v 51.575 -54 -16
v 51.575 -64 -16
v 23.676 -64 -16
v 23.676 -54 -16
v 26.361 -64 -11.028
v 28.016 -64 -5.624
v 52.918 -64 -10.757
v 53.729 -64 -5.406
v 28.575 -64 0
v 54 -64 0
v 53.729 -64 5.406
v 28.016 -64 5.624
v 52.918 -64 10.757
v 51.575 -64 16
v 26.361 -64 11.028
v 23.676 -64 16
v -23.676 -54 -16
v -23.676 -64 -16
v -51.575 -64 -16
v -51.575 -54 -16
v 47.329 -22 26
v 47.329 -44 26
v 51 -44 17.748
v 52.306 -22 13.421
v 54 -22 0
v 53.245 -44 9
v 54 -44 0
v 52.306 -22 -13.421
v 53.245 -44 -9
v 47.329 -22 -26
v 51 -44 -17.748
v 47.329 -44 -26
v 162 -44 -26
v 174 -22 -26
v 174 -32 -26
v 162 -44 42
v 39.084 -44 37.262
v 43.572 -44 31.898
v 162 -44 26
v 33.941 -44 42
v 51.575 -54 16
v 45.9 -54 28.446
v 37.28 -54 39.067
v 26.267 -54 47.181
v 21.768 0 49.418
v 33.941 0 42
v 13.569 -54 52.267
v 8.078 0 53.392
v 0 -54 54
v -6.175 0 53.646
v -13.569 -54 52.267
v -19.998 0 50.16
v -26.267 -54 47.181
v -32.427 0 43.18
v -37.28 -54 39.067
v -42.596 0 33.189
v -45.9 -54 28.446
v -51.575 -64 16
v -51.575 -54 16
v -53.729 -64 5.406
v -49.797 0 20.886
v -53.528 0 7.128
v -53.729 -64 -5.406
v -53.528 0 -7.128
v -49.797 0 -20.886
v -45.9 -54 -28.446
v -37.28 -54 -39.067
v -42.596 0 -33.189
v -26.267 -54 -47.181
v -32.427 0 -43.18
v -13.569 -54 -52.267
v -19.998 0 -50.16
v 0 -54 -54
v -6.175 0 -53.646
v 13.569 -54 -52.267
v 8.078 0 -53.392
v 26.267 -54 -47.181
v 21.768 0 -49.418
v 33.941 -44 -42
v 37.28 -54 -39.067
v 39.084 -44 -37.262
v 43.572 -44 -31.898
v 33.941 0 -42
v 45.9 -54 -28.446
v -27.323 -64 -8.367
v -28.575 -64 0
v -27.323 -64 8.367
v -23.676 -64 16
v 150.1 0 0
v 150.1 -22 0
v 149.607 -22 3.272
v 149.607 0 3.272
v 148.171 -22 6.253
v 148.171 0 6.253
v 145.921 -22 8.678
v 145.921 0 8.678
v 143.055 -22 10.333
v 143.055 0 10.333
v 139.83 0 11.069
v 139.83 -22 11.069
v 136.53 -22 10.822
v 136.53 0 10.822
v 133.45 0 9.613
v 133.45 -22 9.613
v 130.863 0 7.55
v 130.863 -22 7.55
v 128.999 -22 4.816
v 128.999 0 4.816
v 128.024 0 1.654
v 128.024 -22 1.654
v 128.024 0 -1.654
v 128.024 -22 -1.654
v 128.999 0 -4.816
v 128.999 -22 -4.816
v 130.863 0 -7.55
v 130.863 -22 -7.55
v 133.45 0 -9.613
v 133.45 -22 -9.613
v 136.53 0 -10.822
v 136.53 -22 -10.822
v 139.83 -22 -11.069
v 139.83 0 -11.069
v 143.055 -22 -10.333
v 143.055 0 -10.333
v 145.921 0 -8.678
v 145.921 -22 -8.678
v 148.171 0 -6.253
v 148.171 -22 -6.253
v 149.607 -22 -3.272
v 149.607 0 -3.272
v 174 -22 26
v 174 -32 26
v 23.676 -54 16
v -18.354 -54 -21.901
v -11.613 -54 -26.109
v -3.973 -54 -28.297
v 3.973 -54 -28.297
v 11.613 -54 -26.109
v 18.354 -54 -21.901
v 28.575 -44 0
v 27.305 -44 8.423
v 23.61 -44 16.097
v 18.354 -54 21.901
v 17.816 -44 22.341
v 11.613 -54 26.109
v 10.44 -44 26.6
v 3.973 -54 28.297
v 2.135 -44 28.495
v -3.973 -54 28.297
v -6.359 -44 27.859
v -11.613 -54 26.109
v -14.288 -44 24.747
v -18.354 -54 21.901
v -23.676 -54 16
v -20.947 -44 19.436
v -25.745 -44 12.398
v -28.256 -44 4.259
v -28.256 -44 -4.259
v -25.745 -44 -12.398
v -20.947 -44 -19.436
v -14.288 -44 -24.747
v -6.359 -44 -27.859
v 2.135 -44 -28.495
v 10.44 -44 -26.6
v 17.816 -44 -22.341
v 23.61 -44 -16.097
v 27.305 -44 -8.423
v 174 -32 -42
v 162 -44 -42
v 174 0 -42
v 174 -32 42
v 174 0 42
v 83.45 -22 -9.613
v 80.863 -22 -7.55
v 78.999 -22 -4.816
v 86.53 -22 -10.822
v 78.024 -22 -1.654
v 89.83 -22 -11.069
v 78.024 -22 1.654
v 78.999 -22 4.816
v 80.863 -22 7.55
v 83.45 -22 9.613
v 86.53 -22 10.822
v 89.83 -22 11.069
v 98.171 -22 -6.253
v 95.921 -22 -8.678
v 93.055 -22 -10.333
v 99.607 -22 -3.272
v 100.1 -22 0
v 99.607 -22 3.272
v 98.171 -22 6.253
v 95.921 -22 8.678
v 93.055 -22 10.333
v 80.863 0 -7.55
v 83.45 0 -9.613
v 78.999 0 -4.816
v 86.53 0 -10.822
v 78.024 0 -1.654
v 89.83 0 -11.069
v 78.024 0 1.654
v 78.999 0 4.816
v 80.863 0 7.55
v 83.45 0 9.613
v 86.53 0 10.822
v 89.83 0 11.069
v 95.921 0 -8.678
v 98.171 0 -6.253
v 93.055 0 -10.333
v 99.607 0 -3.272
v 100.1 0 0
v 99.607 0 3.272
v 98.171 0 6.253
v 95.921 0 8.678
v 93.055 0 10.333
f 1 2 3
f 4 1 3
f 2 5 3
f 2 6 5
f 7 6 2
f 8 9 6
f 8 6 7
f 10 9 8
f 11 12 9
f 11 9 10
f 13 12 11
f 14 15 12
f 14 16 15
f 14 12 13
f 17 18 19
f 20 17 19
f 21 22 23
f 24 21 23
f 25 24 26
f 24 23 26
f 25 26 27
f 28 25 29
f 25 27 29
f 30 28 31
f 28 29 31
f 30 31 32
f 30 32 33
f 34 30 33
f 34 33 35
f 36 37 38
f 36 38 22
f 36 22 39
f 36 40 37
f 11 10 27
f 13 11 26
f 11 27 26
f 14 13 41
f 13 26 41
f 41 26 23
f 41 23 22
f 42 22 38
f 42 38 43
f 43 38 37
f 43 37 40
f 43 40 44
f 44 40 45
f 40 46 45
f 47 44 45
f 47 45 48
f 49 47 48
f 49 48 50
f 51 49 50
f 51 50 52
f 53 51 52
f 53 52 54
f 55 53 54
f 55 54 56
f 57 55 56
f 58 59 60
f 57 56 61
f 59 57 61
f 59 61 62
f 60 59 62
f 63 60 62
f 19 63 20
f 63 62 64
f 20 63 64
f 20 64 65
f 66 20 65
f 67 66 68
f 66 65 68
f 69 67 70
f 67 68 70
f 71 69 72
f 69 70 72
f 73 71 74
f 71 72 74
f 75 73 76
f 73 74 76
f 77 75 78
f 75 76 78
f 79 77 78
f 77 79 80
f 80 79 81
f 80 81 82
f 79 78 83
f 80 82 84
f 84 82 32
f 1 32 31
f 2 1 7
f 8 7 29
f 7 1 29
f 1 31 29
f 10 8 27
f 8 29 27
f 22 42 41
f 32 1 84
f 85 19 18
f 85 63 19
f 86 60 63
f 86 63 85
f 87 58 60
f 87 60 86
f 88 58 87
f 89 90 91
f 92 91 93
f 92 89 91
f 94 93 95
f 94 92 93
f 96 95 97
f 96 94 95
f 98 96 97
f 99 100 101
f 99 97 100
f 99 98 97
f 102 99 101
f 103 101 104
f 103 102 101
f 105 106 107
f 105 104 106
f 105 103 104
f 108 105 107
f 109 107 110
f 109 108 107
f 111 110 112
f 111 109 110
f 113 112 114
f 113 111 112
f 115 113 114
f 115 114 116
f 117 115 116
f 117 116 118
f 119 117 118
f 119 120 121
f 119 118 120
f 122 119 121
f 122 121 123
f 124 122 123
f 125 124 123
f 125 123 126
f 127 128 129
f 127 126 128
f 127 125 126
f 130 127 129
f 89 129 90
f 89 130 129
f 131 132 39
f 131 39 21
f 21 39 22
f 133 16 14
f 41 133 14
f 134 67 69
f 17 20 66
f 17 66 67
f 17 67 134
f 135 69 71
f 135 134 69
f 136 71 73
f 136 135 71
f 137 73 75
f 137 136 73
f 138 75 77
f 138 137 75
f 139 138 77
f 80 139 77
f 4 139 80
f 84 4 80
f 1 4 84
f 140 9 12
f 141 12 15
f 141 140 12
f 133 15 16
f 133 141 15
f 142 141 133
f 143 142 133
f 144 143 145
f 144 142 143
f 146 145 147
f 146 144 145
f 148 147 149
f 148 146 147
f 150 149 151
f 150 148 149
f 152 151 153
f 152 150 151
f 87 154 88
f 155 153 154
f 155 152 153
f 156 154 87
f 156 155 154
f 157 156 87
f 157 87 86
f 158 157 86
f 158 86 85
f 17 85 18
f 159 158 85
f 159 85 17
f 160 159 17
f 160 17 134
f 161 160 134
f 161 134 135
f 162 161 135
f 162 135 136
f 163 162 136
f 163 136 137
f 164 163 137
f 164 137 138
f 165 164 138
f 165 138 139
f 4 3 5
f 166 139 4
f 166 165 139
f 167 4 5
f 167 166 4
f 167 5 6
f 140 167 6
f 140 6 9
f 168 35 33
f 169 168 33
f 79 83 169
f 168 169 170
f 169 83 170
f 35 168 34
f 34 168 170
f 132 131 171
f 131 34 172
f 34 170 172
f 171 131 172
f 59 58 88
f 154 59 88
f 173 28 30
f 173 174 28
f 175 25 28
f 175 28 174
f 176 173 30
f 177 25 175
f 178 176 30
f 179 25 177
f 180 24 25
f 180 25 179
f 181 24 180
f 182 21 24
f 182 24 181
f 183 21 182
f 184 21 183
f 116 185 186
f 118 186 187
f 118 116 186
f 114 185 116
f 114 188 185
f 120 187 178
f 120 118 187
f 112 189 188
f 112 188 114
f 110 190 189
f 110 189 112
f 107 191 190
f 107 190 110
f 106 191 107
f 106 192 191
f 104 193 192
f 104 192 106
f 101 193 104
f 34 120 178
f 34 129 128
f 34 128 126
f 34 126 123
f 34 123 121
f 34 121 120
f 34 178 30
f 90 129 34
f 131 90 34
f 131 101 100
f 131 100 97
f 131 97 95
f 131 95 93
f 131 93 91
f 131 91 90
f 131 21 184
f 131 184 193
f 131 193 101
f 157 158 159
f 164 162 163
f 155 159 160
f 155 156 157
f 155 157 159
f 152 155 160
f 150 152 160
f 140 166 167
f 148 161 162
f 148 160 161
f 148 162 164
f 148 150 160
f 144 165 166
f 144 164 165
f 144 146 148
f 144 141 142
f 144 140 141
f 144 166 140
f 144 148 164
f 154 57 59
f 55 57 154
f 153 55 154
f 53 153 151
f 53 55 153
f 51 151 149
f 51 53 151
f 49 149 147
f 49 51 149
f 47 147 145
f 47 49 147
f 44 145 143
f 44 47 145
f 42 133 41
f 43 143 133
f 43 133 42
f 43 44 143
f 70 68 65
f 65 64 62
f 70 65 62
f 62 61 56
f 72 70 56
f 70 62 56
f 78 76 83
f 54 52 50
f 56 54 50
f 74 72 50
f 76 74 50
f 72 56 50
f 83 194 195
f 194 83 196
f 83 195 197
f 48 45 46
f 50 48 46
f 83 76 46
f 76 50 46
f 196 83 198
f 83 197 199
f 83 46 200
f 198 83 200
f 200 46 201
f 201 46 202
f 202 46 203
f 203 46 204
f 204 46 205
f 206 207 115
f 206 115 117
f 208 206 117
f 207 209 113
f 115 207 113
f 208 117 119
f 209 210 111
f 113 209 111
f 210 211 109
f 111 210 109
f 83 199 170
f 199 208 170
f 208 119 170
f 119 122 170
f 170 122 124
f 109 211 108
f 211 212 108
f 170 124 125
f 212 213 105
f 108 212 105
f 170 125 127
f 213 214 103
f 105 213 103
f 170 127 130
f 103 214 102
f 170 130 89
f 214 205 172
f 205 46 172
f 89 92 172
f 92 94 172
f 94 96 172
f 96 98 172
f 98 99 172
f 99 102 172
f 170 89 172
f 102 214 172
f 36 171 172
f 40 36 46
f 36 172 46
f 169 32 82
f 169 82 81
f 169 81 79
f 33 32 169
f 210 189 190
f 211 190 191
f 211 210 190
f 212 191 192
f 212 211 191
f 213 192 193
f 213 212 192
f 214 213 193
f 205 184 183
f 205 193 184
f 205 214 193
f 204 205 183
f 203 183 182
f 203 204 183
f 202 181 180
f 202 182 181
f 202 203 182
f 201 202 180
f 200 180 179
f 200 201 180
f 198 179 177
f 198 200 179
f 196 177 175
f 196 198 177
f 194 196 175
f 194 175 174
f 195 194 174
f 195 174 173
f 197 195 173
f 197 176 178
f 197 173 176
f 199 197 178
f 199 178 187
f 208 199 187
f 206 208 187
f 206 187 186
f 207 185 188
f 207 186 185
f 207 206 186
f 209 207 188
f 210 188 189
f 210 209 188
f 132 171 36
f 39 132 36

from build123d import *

# Parameters (mm, degrees)
F0_R      = 54
F0_R_2    = 28.575
F1_DEPTH  = 64
F2_R      = 11.1
F3_DEPTH  = 44
F6_DEPTH  = 22
F8_DEPTH  = 114.55193
F10_DEPTH = 10


with BuildPart() as f1:
    # F0 (on Front) → F1 (new body)
    with BuildSketch(Plane.XZ):
        Circle(F0_R)
        Circle(F0_R_2, mode=Mode.SUBTRACT)
    extrude(amount=F1_DEPTH)

    # F2 (on Front) → F3 (join)
    with BuildSketch(Plane.XZ):
        with BuildLine():
            ThreePointArc((33.941125, -42), (48.727922, -23.272078), (54, 0))
            ThreePointArc((54, 0), (48.727922, 23.272078), (33.941125, 42))
            ThreePointArc((33.941125, 42), (-54, 0), (33.941125, -42))
        make_face()
        with BuildLine():
            ThreePointArc((33.941125, 42), (48.727922, 23.272078), (54, 0))
            ThreePointArc((54, 0), (48.727922, -23.272078), (33.941125, -42))
            Line((33.941125, -42), (174, -42))
            Line((174, -42), (174, 42))
            Line((174, 42), (33.941125, 42))
        make_face()
        with Locations((89, 0)):
            Circle(F2_R, mode=Mode.SUBTRACT)
        with Locations((139, 0)):
            Circle(F2_R, mode=Mode.SUBTRACT)
    extrude(amount=F3_DEPTH)

    # F5 (on face) → F6 (cut)
    with BuildSketch(Plane.XZ.offset(44)):
        with BuildLine():
            Line((174, -26), (174, 26))
            Line((174, 26), (47.328638, 26))
            ThreePointArc((47.328638, 26), (54, 0), (47.328638, -26))
            Line((47.328638, -26), (174, -26))
        make_face()
    extrude(amount=-F6_DEPTH, mode=Mode.SUBTRACT)

    # F7 (on face) → F8 (cut)
    with BuildSketch(Plane.XY.offset(42)):
        Polygon((174, -32), (162, -44), (174, -44), align=None)
    extrude(amount=-F8_DEPTH, mode=Mode.SUBTRACT)

    # F9 (on face) → F10 (cut)
    with BuildSketch(Plane.XZ.offset(64)):
        with BuildLine():
            ThreePointArc((51.575188, 16), (0, 54), (-51.575188, 16))
            Line((-51.575188, 16), (-23.675528, 16))
            ThreePointArc((-23.675528, 16), (0, 28.575), (23.675528, 16))
            Line((23.675528, 16), (51.575188, 16))
        make_face()
        with BuildLine():
            Line((-23.675528, -16), (-51.575188, -16))
            ThreePointArc((-51.575188, -16), (0, -54), (51.575188, -16))
            Line((51.575188, -16), (23.675528, -16))
            ThreePointArc((23.675528, -16), (0, -28.575), (-23.675528, -16))
        make_face()
    extrude(amount=-F10_DEPTH, mode=Mode.SUBTRACT)


solid = f1.part
